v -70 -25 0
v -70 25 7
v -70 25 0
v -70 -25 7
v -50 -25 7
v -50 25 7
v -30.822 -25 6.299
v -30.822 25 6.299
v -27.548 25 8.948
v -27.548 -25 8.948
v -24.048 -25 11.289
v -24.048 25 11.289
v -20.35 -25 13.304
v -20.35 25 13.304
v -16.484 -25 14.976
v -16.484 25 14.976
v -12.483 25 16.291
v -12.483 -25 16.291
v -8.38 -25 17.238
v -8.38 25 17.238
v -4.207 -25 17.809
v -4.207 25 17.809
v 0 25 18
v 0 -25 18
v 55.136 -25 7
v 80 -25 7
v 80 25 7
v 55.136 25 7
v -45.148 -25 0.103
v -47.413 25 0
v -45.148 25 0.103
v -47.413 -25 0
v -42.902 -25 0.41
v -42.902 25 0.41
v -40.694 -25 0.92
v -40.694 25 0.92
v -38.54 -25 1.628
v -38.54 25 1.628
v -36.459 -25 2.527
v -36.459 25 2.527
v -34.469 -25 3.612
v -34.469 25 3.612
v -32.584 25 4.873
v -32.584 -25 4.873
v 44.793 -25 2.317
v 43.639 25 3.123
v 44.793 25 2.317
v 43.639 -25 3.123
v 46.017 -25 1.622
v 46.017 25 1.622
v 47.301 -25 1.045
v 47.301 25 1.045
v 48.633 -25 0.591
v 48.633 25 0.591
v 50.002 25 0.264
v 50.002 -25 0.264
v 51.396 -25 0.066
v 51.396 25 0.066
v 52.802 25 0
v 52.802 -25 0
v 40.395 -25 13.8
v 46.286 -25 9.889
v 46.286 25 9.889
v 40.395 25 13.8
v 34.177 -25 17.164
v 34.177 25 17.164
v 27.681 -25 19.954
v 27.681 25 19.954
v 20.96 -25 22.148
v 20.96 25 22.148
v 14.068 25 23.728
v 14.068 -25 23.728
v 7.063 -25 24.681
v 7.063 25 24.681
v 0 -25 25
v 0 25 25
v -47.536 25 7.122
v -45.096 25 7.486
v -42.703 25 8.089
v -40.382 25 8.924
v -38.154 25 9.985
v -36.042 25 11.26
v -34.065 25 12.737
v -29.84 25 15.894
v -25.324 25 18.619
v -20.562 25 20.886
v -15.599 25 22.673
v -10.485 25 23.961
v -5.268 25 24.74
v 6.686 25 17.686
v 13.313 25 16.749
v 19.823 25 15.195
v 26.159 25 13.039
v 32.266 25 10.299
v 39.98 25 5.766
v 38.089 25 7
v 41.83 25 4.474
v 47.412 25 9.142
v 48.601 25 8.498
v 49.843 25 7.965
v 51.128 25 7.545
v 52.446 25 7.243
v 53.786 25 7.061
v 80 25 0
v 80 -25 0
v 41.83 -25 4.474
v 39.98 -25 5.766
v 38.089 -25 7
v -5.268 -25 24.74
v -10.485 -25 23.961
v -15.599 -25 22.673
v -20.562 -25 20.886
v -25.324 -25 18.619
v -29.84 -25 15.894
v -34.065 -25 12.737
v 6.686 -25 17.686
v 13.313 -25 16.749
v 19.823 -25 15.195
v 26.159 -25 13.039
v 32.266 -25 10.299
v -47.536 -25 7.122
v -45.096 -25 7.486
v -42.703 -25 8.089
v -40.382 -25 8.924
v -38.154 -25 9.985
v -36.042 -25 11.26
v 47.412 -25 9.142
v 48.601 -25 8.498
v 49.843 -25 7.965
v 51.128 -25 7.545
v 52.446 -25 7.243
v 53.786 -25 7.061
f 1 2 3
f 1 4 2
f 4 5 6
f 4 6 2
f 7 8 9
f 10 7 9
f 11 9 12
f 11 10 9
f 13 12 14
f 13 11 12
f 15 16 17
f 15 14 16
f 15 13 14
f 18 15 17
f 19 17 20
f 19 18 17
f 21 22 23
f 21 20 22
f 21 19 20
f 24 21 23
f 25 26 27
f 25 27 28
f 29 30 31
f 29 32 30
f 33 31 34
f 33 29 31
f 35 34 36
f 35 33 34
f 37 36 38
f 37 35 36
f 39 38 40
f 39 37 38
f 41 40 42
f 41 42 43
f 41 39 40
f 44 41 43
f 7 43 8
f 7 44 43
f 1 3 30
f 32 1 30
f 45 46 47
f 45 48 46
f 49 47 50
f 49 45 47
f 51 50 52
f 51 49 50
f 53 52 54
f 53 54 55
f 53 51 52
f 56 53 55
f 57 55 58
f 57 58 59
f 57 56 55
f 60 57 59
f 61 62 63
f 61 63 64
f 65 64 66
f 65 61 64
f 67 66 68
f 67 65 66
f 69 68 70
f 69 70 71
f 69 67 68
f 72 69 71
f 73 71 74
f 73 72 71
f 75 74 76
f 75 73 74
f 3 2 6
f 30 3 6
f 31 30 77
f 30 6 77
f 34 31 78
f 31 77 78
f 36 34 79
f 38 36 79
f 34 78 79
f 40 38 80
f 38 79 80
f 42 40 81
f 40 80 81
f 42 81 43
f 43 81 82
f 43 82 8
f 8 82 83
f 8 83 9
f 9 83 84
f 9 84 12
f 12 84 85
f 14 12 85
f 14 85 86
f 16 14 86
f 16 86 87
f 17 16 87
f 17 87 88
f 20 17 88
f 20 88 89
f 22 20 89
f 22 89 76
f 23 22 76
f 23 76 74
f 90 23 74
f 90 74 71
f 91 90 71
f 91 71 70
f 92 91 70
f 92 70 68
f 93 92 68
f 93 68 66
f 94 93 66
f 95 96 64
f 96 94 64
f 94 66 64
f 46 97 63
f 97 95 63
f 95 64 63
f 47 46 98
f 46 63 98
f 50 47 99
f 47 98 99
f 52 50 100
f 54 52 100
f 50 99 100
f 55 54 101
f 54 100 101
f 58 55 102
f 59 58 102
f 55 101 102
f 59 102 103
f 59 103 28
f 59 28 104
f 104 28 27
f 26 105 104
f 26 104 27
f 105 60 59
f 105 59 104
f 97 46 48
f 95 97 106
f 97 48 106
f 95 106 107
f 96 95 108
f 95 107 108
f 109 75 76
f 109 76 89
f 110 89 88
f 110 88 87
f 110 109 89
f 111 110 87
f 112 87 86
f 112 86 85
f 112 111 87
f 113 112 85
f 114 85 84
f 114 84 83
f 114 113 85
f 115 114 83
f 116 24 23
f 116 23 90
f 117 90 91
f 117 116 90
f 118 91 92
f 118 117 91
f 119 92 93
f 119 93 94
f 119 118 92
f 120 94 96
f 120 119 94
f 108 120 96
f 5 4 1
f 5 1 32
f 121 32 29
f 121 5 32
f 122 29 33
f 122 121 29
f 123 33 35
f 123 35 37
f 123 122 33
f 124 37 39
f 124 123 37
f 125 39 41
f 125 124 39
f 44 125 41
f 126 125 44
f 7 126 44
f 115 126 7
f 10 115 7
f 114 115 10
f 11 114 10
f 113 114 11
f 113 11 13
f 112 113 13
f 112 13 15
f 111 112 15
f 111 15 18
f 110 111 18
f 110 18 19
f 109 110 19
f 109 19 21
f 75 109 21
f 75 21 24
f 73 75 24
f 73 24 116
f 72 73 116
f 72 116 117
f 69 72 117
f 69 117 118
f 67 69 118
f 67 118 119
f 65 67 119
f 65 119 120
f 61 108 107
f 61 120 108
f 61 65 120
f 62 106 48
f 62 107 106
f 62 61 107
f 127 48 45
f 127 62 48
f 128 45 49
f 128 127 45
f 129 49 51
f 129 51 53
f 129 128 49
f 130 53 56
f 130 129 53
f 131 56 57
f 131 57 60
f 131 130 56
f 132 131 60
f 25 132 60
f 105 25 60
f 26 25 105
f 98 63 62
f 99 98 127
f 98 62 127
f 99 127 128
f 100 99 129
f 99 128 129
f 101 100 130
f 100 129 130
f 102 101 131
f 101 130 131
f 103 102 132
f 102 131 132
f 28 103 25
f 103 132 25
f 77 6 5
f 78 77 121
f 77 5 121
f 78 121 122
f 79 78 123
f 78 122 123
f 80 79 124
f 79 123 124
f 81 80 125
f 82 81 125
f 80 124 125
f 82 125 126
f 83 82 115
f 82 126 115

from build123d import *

# Parameters (mm, degrees)
F6_DEPTH  = 25
F7_DEPTH  = 25
F8_DEPTH  = 25
F9_DEPTH  = 25
F10_DEPTH = 25
F11_R     = 25
F12_R     = 15


with BuildPart() as f6:
    # F3 (on Front) → F6 (new body, symmetric)
    with BuildSketch(Plane.XZ):
        Polygon((-70, 0), (0, 0), (80, 0), (80, 7), (50, 7), (-40, 7), (-70, 7), align=None)
    extrude(amount=F6_DEPTH, both=True)

    # F4 (on Front) → F7 (join, symmetric)
    with BuildSketch(Plane.XZ):
        with BuildLine():
            Line((0, 18), (0, 25))
            ThreePointArc((0, 25), (-25.8467706988, 18.3343230299), (-45.2462398683, 0))
            Line((-45.2462398683, 0), (-36.7151195014, 0))
            ThreePointArc((-36.7151195014, 0), (-20.4450483003, 13.257910642), (0, 18))
        make_face()
    extrude(amount=F7_DEPTH, both=True)

    # F5 (on Front) → F8 (join, symmetric)
    with BuildSketch(Plane.XZ):
        with BuildLine():
            Line((47.4130783645, 0), (57.4214439232, 0))
            ThreePointArc((57.4214439232, 0), (31.3138237134, 18.4789544508), (0, 25))
            Line((0, 25), (0, 18))
            ThreePointArc((0, 18), (25.3574446662, 13.3485839491), (47.4130783645, 0))
        make_face()
    extrude(amount=F8_DEPTH, both=True)

    # F4 (on Front) → F9 (cut, symmetric)
    with BuildSketch(Plane.XZ):
        with BuildLine():
            Line((0, 0), (0, 18))
            ThreePointArc((0, 18), (-20.4450483003, 13.257910642), (-36.7151195014, 0))
            Line((-36.7151195014, 0), (0, 0))
        make_face()
        with BuildLine():
            Line((0, 0), (-36.7151195014, 0))
            ThreePointArc((-36.7151195014, 0), (-41.7023550864, -48.8894927447), (0, -74.8888888889))
            Line((0, -74.8888888889), (0, 0))
        make_face()
    extrude(amount=F9_DEPTH, both=True, mode=Mode.SUBTRACT)

    # F5 (on Front) → F10 (cut, symmetric)
    with BuildSketch(Plane.XZ):
        with BuildLine():
            Line((0, 0), (0, -124.8888888889))
            ThreePointArc((0, -124.8888888889), (66.7930283935, -78.8018891107), (47.4130783645, 0))
            Line((47.4130783645, 0), (0, 0))
        make_face()
        with BuildLine():
            Line((0, 0), (47.4130783645, 0))
            ThreePointArc((47.4130783645, 0), (25.3574446662, 13.3485839491), (0, 18))
            Line((0, 18), (0, 0))
        make_face()
    extrude(amount=F10_DEPTH, both=True, mode=Mode.SUBTRACT)

    # F11
    f11_edges = [f6.edges().sort_by_distance(p)[0] for p in [
        (-40, 0, 7),
        (-36.71512, 0, 0),
    ]]
    fillet(f11_edges, radius=F11_R)

    # F12
    f12_edges = [f6.edges().sort_by_distance(p)[0] for p in [
        (50, 0, 7),
        (47.413078, 0, 0),
    ]]
    fillet(f12_edges, radius=F12_R)


solid = f6.part
